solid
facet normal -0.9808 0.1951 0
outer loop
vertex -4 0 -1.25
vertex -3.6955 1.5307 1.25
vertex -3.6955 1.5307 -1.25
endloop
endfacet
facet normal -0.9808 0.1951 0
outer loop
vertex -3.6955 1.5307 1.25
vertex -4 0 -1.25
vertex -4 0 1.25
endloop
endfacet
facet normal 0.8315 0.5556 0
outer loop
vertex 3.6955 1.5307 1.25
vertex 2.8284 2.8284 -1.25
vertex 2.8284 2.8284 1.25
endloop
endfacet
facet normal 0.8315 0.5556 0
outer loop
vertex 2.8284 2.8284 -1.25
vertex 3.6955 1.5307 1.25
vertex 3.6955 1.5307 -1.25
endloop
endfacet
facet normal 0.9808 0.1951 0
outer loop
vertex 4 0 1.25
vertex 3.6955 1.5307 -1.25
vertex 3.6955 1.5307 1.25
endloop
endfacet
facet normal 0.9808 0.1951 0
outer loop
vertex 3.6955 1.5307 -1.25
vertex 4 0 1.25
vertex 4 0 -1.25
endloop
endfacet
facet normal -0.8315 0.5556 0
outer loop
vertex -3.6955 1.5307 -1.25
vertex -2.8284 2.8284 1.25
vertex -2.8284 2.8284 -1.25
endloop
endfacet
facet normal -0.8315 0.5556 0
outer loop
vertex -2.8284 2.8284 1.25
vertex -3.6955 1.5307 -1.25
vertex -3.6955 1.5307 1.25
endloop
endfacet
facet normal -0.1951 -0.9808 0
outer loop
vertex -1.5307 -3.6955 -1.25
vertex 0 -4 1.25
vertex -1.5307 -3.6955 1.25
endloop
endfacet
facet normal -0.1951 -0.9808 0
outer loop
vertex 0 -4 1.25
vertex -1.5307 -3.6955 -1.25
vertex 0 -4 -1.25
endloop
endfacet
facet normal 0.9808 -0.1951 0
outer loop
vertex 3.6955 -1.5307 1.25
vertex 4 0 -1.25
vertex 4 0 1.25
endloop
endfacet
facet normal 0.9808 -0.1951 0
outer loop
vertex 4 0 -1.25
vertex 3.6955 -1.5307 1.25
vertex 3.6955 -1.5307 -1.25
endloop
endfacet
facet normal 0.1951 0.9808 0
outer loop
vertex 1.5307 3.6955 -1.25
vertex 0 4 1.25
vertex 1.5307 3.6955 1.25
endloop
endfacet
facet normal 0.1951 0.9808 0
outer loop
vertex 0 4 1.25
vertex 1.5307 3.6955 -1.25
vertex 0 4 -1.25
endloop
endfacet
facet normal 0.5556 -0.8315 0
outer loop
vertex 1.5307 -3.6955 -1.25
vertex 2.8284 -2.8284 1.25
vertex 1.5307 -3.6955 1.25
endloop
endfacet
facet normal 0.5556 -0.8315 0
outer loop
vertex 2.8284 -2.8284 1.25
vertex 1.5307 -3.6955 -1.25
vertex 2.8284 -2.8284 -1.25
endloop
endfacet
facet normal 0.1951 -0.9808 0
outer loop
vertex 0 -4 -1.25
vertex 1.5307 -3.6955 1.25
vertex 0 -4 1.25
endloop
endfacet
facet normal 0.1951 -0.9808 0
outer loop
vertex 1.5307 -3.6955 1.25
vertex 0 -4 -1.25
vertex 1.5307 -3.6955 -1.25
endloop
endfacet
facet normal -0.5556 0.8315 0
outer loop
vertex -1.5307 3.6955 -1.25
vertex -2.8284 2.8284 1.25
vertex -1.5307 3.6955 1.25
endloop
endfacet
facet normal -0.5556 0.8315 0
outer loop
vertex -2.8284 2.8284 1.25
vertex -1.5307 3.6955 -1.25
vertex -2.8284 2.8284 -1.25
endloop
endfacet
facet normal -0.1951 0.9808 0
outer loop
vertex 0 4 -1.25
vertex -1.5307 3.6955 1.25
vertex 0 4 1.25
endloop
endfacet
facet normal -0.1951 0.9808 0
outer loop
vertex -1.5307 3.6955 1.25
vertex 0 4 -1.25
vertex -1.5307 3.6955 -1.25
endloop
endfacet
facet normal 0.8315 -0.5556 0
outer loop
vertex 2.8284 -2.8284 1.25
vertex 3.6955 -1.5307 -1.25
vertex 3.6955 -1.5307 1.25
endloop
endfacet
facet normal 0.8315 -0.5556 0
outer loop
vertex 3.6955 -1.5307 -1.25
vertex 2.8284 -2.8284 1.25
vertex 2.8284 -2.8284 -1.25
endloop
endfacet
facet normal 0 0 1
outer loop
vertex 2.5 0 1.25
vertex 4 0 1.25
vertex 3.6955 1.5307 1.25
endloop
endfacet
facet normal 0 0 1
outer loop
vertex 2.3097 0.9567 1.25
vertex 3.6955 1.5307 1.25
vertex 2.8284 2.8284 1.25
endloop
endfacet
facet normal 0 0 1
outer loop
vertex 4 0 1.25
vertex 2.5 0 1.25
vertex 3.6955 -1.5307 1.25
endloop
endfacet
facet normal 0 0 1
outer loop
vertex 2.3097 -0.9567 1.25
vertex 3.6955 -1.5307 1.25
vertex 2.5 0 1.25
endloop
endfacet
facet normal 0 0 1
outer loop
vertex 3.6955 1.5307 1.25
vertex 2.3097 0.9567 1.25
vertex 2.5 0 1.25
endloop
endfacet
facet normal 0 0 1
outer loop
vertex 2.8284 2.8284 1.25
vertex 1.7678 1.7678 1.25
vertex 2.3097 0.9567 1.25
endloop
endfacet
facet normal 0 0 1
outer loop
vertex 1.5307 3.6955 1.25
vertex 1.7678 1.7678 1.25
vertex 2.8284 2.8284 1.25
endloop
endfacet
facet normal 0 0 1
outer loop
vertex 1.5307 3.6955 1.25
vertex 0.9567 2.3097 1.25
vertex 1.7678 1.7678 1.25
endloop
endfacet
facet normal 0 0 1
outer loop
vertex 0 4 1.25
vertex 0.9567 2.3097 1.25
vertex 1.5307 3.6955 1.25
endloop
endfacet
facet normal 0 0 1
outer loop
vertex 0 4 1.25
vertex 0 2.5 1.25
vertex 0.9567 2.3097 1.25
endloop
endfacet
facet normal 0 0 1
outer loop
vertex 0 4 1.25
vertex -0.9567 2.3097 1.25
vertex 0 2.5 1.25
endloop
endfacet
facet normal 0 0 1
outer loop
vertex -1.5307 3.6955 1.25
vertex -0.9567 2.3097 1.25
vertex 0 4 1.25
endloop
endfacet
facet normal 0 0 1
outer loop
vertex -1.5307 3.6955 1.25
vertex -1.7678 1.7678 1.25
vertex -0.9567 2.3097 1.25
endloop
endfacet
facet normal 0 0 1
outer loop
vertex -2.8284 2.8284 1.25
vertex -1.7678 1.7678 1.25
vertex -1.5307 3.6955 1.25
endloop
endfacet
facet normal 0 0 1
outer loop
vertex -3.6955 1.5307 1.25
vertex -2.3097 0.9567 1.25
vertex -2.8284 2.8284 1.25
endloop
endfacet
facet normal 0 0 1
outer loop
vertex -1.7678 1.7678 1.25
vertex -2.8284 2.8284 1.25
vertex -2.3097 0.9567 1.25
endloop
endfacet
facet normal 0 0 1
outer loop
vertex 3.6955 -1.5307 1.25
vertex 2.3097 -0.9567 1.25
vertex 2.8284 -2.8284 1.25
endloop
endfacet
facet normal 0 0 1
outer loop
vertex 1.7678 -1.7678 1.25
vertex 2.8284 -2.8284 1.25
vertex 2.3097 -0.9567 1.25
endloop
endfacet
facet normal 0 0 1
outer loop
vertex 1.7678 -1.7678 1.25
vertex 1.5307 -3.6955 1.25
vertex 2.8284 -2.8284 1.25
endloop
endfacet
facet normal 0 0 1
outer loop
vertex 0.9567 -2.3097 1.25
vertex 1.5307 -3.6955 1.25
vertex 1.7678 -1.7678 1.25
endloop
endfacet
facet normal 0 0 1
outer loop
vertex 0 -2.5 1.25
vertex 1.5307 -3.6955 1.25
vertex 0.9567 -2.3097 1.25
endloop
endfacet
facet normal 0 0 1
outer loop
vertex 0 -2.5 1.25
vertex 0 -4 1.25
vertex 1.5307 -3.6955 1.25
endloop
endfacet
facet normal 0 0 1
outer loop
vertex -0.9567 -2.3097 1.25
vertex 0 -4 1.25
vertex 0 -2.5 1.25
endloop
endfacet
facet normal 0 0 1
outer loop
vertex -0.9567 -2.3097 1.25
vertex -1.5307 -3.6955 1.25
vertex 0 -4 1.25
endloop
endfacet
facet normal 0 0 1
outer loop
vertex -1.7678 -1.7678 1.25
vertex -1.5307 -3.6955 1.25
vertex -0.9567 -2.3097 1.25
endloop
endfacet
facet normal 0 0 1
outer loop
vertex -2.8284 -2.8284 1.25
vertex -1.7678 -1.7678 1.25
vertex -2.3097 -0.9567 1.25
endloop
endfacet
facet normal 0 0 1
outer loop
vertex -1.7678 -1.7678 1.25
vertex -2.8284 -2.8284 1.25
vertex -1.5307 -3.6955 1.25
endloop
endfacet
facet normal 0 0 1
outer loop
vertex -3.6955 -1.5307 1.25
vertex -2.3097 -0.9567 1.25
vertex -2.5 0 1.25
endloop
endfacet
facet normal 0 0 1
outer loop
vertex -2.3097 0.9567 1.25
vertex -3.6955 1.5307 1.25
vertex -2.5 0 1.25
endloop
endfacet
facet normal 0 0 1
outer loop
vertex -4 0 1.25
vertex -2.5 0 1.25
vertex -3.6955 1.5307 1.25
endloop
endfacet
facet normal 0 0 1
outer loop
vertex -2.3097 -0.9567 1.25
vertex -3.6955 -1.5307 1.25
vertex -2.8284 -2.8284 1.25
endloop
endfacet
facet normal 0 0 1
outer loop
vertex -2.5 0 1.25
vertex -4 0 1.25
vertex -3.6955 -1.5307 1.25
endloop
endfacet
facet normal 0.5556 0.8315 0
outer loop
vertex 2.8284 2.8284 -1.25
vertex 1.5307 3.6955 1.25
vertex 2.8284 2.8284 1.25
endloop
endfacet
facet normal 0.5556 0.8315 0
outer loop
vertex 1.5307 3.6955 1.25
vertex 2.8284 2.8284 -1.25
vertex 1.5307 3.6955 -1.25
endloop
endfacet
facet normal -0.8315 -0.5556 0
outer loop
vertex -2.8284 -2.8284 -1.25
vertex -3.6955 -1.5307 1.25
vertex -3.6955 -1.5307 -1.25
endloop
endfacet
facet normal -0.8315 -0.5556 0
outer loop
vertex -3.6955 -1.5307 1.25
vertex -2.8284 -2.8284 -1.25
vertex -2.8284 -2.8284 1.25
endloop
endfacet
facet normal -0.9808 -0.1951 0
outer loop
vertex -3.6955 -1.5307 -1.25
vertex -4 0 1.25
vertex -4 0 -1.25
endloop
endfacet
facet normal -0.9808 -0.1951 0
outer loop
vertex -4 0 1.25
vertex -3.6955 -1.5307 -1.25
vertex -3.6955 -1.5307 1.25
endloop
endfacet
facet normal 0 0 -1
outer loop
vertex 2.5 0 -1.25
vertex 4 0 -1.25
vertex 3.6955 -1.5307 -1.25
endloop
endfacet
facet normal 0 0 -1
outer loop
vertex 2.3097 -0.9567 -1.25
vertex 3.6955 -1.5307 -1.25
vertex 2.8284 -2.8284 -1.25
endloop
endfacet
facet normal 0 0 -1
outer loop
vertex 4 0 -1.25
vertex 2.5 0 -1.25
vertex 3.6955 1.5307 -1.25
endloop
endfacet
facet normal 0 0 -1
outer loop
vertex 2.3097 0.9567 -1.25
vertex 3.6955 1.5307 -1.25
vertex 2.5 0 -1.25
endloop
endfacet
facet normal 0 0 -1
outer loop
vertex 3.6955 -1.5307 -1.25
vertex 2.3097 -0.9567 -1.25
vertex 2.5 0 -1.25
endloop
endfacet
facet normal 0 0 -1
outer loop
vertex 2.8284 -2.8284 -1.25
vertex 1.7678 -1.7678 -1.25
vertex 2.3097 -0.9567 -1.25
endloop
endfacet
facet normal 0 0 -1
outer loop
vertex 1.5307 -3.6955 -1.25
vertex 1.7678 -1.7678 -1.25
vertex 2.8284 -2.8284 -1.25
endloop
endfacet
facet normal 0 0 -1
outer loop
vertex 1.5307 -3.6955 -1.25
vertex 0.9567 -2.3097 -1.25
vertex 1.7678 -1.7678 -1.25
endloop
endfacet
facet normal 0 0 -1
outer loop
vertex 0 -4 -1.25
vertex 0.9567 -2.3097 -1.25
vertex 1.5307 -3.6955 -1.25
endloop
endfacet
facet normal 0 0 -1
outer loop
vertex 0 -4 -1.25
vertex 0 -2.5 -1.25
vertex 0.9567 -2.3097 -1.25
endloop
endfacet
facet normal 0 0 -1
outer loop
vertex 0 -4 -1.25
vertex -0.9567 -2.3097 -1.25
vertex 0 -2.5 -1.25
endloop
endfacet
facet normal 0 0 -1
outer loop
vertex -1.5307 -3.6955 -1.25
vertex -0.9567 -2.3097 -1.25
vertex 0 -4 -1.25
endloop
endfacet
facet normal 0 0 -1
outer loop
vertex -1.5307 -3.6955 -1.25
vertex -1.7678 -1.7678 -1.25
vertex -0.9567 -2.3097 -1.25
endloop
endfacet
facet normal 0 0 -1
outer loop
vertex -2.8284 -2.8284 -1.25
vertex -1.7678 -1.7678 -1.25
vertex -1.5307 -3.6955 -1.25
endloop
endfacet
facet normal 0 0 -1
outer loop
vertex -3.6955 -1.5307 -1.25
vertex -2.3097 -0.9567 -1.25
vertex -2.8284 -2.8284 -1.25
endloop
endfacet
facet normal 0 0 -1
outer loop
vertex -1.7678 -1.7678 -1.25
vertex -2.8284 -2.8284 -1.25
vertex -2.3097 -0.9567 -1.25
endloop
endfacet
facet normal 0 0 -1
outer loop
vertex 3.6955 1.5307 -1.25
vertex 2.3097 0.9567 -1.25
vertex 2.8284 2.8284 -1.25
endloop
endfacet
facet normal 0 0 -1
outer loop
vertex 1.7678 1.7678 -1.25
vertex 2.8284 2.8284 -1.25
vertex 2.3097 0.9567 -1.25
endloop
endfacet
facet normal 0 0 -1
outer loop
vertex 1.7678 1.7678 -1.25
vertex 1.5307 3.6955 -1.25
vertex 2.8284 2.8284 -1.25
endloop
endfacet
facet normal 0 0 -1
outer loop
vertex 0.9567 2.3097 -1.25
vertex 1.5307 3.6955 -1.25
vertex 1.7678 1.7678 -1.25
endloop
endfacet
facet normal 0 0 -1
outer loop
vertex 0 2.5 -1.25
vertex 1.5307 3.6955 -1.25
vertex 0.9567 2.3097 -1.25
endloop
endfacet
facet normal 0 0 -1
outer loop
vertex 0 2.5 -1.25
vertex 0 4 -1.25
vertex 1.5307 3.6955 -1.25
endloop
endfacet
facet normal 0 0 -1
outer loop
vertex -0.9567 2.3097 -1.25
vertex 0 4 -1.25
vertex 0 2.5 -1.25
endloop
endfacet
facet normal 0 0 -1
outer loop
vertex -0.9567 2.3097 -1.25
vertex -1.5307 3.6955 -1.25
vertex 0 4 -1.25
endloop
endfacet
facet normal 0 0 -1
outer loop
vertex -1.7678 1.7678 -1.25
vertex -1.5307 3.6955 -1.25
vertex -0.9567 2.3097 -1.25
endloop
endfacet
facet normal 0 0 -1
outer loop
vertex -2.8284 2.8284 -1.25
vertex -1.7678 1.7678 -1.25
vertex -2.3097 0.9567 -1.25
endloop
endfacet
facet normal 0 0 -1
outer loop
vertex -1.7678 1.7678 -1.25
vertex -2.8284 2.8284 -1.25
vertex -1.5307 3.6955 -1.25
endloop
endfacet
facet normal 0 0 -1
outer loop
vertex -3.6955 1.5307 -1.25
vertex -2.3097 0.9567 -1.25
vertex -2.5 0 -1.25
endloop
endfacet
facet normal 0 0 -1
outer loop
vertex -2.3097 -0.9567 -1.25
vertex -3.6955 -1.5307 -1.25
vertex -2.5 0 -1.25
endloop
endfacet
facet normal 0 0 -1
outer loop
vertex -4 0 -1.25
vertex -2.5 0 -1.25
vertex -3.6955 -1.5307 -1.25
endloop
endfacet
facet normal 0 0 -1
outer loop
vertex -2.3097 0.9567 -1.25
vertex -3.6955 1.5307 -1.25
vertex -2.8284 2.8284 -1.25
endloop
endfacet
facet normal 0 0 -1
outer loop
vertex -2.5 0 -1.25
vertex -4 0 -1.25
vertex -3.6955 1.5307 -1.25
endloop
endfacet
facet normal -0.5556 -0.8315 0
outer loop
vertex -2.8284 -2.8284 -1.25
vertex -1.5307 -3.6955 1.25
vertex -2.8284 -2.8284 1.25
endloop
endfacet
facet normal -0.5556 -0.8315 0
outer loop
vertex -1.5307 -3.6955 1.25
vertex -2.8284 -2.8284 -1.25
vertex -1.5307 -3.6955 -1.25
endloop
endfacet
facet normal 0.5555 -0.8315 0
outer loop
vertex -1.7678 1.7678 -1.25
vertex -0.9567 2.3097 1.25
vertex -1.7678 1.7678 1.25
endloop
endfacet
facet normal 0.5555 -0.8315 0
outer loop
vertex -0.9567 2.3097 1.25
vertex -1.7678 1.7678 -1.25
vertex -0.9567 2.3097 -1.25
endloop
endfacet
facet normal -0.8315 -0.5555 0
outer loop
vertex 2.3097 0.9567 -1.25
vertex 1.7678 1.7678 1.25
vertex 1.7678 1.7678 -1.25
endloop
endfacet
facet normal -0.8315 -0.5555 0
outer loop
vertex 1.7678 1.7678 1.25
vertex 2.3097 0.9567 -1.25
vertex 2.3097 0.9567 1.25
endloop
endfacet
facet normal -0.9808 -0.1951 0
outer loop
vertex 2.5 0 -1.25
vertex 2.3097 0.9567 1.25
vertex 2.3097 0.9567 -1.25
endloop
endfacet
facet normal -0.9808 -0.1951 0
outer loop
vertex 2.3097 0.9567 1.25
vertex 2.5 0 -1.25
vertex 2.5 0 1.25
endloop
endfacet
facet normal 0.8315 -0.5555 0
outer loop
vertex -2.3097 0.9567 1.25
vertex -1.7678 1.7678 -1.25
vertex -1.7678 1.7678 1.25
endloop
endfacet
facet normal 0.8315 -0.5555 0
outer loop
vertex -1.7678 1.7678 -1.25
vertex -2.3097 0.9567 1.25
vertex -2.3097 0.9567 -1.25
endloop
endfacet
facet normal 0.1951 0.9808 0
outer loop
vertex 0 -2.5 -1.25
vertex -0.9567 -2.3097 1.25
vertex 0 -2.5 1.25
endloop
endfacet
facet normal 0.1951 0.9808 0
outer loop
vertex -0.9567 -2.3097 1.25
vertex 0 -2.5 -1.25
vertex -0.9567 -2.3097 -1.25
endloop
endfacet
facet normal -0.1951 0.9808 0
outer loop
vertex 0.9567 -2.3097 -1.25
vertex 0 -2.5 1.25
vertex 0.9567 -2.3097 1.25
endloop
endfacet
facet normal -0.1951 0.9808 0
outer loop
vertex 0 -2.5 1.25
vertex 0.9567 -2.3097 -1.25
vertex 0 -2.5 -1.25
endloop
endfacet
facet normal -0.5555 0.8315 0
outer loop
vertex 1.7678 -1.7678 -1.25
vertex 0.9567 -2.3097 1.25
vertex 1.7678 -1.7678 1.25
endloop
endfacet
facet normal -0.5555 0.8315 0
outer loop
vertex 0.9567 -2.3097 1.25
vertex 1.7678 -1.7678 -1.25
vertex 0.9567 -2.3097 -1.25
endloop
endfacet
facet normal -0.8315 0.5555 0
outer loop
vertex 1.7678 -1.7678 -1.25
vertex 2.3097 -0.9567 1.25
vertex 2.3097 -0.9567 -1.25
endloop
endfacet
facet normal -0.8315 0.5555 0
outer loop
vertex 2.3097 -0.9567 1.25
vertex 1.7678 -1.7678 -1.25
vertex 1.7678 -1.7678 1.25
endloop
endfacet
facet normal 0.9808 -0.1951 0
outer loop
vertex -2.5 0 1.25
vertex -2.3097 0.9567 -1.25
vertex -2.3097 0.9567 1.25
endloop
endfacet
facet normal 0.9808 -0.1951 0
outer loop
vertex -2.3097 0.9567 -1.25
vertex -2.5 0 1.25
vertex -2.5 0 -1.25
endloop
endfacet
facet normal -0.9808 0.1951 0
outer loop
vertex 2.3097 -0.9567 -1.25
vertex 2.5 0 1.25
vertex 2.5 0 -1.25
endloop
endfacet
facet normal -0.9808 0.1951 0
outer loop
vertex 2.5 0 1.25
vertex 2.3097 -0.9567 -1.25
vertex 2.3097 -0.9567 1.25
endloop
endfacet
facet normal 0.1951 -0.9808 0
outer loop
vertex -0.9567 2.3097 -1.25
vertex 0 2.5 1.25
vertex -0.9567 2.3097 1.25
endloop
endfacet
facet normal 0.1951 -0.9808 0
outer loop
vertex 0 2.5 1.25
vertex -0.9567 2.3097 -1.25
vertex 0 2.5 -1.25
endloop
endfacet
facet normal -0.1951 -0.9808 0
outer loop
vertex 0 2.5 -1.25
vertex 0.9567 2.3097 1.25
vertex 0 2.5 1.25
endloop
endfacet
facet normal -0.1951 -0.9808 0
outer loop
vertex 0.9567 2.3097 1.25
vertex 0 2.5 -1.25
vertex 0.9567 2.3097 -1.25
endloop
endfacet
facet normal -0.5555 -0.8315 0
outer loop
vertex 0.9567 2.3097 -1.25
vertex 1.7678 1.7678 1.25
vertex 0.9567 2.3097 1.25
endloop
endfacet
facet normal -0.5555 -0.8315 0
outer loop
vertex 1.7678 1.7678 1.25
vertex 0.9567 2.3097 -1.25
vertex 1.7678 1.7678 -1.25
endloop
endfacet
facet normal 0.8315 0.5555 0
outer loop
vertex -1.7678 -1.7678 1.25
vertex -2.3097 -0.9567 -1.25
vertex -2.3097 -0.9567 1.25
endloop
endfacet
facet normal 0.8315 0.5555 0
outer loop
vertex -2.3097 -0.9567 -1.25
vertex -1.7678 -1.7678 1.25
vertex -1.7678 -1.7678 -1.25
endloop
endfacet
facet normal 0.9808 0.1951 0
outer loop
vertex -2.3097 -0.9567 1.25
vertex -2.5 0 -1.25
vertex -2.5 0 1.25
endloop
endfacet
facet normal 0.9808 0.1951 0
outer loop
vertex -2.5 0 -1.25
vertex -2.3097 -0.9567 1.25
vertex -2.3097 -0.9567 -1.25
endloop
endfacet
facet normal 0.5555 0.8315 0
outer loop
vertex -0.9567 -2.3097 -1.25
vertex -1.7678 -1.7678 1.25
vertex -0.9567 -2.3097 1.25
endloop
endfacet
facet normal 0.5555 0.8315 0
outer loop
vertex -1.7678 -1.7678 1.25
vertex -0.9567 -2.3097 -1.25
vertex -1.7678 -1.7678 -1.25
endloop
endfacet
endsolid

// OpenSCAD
 // Author Michael Marques (DrYerzinia)

// http://www.ebay.com/itm/10-PCS-683-3x7x2-mm-Metal-OPEN-PRECISION-Miniature-Ball-Bearing-3-7-2-/291206307942?hash=item43cd3fa066:m:mCi6eovrGVk_CjIUjlhw8yg
// E-Bay empire.rc

module washer_M3_7x3_2x0_5mm(){

	difference(){
		cylinder(
			h = 0.5,
			r = 7 / 2,
			$fn = 16,
			center = true);
		cylinder(
			h = 0.5 + 0.1,
			r = 3.2 / 2,
			$fn = 16,
			center = true);
	}

}

module bearing_3x7x2mm(){

	difference(){
		cylinder(
			h = 2,
			r = 7 / 2,
			$fn = 16,
			center = true);
		cylinder(
			h = 2 + 1,
			r = 3 / 2,
			$fn = 16,
			center = true);
	}

}

module bearing_5x8x2_5mm(){

	difference(){
		cylinder(
			h = 2.5,
			r = 8 / 2,
			$fn = 16,
			center = true);
		cylinder(
			h = 2.5 + 1,
			r = 5 / 2,
			$fn = 16,
			center = true);
	}

}

module bearing_8x16x5mm(){

	difference(){
		cylinder(
			h = 5,
			r = 16 / 2,
			$fn = 16,
			center = true);
		cylinder(
			h = 5 + 1,
			r = 8 / 2,
			$fn = 16,
			center = true);
	}

}


bearing_5x8x2_5mm();
